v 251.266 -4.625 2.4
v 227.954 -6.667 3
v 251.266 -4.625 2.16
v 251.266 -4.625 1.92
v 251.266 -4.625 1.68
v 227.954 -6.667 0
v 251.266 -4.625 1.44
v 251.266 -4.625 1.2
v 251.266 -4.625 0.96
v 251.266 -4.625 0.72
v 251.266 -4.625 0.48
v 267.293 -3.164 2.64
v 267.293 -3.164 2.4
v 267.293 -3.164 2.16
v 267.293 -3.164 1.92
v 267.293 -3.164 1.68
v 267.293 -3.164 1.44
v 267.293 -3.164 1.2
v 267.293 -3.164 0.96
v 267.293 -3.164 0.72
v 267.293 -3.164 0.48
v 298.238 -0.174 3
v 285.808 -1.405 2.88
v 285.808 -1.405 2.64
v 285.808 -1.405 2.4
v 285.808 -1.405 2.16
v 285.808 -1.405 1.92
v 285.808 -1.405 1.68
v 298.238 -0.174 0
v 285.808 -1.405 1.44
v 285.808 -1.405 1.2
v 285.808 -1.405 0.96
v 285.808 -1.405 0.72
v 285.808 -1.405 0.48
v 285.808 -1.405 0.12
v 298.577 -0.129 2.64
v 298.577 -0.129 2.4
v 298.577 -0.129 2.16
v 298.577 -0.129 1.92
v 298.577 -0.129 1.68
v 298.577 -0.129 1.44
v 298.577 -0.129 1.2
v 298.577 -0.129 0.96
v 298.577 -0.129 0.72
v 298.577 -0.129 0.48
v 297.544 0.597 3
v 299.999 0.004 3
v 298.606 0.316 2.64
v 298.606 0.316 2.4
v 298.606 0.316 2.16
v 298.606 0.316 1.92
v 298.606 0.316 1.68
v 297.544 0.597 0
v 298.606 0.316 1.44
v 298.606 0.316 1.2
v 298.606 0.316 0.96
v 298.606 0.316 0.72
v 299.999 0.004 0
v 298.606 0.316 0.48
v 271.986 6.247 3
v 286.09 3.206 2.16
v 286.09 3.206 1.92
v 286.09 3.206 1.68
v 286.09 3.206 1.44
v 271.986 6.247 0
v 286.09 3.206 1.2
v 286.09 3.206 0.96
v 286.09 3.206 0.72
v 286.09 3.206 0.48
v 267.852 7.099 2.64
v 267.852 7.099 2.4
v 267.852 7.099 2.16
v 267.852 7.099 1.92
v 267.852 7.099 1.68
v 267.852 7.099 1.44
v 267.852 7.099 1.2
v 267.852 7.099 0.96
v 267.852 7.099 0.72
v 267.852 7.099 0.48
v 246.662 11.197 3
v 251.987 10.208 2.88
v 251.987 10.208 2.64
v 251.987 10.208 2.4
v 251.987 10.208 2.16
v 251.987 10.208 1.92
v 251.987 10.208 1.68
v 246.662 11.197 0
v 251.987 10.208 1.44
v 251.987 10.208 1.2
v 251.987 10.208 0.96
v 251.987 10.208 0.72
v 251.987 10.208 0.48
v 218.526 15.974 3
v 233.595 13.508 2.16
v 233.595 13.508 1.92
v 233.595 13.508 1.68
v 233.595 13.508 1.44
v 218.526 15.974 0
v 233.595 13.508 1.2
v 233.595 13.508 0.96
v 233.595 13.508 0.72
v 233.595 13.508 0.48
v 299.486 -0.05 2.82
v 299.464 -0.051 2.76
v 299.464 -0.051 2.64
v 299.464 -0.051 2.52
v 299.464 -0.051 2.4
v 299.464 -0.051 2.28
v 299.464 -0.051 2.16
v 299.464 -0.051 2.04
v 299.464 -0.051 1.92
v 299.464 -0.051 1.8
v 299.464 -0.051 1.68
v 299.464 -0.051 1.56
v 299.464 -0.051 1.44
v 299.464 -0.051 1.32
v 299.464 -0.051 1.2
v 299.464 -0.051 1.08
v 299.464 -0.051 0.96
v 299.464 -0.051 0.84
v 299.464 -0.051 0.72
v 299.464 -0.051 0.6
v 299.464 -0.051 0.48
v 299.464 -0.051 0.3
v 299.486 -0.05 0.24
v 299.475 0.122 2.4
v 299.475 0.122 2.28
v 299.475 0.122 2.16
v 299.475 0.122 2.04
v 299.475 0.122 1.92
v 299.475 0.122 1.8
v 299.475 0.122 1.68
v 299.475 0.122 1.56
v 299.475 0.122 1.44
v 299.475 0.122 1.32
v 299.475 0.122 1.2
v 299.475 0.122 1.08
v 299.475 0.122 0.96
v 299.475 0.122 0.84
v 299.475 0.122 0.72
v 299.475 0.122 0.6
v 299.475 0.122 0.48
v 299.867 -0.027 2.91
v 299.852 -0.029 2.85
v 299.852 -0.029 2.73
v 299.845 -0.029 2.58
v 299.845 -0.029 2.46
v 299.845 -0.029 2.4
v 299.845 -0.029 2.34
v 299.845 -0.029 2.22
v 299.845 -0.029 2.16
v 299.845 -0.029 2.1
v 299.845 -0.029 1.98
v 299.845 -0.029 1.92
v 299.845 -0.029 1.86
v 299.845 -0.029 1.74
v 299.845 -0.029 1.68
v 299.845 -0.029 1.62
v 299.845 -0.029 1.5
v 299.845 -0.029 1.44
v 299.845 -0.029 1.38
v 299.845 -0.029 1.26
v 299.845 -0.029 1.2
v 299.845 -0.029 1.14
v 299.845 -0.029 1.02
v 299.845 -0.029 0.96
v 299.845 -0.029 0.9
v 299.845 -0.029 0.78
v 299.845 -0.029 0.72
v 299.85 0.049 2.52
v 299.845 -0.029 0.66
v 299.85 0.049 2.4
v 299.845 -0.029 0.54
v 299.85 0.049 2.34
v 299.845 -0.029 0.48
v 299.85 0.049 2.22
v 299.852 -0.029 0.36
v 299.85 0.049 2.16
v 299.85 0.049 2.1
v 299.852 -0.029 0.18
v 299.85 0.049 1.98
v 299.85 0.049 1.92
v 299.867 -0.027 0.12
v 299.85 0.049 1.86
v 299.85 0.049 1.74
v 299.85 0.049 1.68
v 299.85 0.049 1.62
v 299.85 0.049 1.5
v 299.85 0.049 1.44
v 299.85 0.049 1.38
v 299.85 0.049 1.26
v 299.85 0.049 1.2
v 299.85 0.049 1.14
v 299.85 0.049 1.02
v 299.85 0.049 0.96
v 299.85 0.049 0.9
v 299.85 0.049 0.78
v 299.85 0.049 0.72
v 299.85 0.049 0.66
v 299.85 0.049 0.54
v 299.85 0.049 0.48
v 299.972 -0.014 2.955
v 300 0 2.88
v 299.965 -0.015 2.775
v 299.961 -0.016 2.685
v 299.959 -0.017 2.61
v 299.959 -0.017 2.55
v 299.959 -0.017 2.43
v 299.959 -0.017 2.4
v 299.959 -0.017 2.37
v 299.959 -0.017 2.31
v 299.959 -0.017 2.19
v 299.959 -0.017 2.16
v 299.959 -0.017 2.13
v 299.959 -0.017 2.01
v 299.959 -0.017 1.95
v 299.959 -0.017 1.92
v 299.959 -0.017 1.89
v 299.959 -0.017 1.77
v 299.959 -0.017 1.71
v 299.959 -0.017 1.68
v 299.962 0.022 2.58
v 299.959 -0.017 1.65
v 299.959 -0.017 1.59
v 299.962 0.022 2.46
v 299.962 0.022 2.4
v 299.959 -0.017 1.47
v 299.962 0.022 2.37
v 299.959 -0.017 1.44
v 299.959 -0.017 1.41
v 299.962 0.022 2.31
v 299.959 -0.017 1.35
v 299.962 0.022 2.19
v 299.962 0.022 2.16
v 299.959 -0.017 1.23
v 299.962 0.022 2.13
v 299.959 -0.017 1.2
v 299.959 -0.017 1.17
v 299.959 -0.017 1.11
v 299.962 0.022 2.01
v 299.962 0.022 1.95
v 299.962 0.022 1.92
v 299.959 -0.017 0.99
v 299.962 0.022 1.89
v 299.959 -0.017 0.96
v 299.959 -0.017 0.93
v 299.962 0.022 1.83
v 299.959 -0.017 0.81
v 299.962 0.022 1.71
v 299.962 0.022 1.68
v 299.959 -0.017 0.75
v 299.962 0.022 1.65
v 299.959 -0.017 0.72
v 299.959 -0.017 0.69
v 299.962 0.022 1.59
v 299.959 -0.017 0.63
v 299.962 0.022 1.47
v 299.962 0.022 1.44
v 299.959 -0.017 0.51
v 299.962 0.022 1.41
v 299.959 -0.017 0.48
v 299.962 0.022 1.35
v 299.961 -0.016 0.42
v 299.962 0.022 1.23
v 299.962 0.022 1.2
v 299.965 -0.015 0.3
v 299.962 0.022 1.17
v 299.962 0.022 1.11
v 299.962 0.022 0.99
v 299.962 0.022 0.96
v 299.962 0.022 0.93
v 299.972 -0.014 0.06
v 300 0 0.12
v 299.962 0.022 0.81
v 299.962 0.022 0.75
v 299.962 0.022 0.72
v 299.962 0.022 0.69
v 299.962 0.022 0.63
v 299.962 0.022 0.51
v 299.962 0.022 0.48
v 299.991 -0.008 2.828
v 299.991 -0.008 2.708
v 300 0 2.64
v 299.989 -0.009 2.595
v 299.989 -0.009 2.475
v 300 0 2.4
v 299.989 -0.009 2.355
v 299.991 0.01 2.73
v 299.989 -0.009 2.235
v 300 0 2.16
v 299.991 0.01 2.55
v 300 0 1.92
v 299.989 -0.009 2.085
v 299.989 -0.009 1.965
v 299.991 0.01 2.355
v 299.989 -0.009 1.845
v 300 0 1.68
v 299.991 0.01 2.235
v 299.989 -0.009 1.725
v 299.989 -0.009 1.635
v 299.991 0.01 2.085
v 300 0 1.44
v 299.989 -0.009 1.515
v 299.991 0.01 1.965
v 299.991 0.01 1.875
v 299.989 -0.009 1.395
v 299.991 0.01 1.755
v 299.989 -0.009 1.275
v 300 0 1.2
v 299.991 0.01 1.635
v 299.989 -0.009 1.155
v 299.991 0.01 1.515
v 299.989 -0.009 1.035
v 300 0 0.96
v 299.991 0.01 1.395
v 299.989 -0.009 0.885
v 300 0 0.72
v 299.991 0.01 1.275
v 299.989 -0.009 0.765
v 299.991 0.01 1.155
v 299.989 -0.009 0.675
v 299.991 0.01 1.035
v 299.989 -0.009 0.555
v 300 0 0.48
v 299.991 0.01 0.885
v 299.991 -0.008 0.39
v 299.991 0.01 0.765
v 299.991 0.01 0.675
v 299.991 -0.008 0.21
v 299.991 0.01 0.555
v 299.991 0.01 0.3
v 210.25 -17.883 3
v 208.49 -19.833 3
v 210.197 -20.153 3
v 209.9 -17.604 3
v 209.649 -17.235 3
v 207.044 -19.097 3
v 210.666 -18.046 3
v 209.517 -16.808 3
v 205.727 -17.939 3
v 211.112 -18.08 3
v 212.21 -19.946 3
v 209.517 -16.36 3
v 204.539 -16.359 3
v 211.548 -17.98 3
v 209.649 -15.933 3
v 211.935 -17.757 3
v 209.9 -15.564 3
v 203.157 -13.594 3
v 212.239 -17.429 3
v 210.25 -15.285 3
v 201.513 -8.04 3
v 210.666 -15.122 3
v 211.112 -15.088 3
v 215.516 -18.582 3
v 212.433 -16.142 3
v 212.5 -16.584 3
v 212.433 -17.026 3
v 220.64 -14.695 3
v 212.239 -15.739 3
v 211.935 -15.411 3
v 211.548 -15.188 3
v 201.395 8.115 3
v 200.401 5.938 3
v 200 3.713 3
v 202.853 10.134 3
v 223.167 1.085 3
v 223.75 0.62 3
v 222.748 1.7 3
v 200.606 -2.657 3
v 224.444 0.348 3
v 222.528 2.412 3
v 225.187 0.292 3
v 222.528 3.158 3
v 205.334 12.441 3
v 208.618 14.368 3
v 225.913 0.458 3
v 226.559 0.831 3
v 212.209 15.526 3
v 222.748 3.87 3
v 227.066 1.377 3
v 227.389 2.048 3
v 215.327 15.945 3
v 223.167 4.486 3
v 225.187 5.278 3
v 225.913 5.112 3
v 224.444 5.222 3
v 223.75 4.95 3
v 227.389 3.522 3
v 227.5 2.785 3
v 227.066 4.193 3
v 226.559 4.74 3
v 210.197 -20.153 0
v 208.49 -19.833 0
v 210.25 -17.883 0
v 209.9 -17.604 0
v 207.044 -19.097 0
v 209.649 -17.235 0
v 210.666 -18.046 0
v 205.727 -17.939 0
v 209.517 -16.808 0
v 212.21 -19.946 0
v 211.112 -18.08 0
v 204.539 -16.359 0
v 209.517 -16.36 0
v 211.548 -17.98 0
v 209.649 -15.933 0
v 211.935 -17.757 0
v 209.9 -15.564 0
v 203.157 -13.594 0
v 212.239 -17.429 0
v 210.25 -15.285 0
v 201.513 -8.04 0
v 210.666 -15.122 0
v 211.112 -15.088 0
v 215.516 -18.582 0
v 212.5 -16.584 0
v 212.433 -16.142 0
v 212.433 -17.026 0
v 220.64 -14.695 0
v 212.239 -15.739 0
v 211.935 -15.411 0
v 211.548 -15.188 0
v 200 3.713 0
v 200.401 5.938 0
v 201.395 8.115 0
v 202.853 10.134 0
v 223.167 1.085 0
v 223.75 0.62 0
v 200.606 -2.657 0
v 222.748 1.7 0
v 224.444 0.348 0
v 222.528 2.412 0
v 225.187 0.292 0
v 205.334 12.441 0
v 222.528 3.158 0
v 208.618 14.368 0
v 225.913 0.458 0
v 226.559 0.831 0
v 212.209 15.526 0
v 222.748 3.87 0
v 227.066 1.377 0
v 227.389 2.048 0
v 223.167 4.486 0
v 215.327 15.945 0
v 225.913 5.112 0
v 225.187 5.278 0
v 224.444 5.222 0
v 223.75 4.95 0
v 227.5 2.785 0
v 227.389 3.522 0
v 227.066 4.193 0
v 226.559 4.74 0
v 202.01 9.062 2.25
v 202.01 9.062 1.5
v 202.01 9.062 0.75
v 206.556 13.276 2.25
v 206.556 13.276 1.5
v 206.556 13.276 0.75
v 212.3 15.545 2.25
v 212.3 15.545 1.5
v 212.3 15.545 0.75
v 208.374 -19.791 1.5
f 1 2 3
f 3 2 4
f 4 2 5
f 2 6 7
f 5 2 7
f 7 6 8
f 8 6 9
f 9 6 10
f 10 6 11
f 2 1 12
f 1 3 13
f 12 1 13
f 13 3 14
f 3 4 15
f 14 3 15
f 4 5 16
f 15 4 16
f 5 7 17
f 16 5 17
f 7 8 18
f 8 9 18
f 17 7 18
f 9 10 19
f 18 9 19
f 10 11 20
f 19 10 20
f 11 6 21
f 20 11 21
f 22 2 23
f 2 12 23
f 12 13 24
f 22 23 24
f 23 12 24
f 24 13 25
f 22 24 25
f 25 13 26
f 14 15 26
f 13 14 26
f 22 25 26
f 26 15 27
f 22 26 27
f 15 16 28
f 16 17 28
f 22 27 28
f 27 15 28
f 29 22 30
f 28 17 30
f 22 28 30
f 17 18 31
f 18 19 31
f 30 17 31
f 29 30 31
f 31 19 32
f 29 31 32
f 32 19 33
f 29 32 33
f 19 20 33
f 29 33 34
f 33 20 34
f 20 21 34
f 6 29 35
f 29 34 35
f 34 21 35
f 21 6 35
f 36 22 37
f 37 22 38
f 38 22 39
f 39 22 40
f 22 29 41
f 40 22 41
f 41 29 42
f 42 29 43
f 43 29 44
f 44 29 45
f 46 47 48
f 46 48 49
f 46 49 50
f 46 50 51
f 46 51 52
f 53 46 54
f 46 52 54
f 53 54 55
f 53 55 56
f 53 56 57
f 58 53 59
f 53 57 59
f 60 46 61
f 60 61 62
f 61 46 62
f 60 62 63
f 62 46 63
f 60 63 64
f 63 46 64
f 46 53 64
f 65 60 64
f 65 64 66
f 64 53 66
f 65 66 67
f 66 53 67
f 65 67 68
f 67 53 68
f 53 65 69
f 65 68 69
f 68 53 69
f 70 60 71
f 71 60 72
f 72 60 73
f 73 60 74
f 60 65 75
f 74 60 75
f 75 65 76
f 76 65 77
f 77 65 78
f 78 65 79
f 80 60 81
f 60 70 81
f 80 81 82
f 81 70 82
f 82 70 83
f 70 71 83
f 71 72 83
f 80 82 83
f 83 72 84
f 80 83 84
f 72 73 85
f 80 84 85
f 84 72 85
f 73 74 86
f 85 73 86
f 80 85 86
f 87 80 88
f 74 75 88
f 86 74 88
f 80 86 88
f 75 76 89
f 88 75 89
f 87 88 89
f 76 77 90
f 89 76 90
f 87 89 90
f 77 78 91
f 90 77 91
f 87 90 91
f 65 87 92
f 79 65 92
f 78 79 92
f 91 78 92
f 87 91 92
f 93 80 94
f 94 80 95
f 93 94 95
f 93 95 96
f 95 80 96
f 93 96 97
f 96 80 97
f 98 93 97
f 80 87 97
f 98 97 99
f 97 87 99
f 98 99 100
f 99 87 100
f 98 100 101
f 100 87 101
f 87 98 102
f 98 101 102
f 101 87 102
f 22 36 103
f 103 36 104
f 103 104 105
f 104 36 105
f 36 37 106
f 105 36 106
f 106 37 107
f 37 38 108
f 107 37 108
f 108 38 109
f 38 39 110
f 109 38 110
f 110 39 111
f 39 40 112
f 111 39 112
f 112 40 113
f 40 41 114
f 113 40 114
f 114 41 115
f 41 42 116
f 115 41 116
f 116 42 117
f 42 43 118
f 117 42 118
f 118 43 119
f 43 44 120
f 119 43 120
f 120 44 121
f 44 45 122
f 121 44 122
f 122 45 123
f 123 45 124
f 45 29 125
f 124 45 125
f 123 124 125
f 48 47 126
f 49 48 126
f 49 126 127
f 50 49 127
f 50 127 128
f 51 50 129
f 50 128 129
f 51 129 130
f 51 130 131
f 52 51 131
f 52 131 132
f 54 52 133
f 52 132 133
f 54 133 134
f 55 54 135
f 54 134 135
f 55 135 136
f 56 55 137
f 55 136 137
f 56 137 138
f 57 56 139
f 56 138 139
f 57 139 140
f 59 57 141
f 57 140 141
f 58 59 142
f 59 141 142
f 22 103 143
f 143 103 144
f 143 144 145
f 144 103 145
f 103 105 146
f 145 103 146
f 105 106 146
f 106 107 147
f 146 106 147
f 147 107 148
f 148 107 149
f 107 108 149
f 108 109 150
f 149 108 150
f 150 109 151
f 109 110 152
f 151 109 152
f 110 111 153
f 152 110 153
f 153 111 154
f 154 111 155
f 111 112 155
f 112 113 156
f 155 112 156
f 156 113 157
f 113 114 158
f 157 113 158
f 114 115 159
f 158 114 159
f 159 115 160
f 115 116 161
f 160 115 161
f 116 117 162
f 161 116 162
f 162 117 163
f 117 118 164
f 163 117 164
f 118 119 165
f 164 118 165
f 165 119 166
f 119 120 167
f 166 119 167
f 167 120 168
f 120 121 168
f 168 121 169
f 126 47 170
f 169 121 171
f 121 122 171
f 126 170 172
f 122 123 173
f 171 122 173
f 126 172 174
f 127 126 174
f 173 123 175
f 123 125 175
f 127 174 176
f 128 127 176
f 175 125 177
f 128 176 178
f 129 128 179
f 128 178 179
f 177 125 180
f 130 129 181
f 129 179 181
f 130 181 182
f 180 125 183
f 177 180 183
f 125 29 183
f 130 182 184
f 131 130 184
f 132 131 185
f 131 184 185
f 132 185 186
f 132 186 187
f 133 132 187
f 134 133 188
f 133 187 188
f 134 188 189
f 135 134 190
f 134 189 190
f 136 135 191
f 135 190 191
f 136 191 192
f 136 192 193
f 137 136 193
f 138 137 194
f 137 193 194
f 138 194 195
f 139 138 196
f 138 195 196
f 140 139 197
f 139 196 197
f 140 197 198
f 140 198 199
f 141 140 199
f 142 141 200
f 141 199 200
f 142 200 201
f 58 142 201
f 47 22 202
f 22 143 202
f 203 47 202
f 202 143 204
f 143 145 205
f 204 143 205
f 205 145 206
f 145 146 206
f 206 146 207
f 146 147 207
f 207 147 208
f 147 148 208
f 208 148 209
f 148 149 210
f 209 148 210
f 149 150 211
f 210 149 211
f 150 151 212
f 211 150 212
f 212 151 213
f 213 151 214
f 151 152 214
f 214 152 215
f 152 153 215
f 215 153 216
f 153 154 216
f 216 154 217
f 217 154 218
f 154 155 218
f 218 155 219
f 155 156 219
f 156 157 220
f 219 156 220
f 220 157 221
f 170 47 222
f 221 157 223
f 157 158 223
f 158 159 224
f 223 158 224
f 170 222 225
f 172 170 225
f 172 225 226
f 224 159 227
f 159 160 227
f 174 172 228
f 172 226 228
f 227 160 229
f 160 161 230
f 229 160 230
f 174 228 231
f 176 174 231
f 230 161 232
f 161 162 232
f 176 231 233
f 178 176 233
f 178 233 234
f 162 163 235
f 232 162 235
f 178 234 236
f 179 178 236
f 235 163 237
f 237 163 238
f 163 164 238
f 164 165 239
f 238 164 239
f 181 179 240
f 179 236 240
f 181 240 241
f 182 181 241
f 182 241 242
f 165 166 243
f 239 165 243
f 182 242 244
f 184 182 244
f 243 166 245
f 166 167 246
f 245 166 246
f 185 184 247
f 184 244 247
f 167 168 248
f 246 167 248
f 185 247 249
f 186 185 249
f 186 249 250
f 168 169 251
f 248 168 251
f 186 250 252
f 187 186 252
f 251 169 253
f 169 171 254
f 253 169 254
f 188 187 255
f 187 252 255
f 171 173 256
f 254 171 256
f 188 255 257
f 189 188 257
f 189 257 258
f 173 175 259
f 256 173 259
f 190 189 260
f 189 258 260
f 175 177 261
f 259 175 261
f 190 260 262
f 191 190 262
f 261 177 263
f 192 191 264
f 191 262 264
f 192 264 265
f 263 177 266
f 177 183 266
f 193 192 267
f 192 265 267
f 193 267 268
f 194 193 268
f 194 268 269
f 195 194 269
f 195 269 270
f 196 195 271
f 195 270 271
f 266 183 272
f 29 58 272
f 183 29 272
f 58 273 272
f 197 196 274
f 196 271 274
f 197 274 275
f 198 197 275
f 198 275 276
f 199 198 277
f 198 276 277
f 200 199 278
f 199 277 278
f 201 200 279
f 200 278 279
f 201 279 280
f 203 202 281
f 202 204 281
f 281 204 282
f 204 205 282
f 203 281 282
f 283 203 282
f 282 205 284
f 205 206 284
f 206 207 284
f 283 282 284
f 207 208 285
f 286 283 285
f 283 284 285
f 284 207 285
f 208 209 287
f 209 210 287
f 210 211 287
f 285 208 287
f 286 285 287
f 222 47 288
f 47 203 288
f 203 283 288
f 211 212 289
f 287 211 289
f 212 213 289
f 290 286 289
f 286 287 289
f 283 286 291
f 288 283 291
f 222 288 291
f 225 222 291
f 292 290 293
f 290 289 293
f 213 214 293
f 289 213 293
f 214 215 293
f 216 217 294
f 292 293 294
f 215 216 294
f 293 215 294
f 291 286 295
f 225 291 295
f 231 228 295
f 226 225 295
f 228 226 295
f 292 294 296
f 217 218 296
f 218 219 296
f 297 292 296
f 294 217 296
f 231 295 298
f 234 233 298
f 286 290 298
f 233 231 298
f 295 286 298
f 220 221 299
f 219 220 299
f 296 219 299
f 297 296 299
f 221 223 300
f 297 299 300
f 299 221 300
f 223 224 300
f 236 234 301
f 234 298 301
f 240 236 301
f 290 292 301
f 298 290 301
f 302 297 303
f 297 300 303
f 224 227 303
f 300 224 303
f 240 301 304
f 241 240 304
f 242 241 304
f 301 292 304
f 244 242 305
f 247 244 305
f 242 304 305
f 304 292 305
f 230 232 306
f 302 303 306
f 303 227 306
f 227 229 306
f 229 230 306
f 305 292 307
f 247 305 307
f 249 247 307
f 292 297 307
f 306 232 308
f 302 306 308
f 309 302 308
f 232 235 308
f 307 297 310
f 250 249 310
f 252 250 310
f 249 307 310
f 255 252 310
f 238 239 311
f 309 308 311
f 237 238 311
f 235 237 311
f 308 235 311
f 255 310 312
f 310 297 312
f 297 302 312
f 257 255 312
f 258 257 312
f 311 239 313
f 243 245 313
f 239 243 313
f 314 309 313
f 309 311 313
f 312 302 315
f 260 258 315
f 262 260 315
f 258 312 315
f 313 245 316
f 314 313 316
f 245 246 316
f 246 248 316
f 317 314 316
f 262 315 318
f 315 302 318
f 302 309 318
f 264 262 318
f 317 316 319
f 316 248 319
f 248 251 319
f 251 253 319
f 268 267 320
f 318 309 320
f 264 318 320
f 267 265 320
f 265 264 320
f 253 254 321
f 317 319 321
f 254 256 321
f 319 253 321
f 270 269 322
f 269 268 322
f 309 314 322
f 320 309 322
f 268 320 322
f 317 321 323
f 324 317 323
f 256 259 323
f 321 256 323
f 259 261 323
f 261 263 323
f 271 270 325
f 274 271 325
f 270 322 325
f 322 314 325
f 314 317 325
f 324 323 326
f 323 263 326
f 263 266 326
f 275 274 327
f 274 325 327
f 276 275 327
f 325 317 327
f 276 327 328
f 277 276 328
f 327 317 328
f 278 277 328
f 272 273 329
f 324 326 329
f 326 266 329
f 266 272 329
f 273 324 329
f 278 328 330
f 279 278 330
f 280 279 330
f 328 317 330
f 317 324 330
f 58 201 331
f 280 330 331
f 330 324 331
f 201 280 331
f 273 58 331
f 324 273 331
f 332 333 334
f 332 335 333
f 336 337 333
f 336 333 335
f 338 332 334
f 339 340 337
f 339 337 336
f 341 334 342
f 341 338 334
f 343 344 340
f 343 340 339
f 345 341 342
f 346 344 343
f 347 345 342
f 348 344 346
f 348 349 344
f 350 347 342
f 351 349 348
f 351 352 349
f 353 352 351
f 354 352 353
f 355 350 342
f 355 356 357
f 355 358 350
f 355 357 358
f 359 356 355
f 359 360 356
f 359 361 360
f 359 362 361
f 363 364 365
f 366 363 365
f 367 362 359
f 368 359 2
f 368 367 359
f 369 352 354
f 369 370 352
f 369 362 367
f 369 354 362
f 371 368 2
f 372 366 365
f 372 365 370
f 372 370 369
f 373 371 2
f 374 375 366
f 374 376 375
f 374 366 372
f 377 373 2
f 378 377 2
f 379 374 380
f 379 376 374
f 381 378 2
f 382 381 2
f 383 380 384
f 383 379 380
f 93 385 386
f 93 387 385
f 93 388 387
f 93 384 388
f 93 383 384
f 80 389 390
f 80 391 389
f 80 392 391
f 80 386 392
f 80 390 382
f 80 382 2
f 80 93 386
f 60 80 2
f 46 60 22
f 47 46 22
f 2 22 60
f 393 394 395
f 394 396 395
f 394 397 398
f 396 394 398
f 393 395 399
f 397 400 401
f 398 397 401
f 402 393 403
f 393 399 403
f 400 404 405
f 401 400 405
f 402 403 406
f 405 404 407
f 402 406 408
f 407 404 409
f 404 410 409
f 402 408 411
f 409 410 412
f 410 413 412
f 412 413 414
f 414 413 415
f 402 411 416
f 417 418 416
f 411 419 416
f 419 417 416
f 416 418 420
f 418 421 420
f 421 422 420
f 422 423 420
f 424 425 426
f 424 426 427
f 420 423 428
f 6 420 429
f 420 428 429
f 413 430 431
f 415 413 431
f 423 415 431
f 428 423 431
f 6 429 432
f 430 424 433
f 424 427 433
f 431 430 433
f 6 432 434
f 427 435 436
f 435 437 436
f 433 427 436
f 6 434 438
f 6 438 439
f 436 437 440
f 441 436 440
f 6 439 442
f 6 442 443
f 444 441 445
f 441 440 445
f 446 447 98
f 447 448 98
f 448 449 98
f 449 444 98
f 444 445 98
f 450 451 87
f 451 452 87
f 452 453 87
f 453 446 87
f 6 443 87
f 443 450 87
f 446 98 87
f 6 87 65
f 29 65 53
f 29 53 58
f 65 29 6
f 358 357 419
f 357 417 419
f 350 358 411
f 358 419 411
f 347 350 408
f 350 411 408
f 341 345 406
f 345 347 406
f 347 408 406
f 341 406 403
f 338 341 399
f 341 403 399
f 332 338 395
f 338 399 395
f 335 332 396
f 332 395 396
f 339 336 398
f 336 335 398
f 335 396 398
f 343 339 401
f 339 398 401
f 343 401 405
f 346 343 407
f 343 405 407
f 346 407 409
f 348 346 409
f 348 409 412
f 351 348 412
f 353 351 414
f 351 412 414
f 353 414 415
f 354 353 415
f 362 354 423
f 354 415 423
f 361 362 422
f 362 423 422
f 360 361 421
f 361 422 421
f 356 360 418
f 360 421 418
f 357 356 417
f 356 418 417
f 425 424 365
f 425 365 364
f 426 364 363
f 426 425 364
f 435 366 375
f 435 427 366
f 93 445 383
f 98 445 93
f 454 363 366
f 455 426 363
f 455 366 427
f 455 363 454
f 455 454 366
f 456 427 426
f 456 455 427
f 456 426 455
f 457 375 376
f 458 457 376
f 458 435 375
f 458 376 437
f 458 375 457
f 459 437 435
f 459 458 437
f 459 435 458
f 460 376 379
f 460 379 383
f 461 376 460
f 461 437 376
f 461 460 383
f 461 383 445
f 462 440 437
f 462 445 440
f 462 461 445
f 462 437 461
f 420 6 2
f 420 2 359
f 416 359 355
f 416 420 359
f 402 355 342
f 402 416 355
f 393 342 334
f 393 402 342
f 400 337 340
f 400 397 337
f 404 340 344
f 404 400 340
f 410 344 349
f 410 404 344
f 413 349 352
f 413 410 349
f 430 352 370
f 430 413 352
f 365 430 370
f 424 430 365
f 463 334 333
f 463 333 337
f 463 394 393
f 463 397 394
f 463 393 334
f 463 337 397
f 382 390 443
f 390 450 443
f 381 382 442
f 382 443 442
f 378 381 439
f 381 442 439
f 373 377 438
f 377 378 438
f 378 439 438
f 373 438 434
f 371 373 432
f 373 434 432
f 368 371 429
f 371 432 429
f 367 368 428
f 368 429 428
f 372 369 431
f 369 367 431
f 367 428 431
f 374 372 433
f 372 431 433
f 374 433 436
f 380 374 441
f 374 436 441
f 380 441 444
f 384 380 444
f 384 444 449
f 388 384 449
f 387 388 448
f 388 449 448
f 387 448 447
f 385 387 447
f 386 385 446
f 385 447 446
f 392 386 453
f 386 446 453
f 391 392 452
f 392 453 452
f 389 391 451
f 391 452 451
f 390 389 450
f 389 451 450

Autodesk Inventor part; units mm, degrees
ref_plane "YZ Plane" through (0, 0, 0) normal (1, 0, 0) x (0, 1, 0)
ref_plane "XZ Plane" through (0, 0, 0) normal (0, 1, 0) x (-1, 0, 0)
ref_plane "XY Plane" through (0, 0, 0) normal (0, 0, 1) x (1, 0, 0)
sketch "Sketch1" plane through (0, 0, 0) normal (0, 0, 1) x (1, 0, 0)
  spline S0 degree 4 poles (227.9538, -6.6666) (233.9795, -6.1502) (242.1312, -5.4418) (252.1108, -4.5554) (263.3906, -3.5266) (270.7075, -2.8494) (277.2598, -2.2283) (283.0709, -1.6797) (287.955, -1.1879) (292.1861, -0.8066) (295.1251, -0.4496) (297.859, -0.2789) (298.9117, -0.0313) (300.6417, -0.0427) (298.9253, 0.1752) (297.9143, 0.5599) (295.2242, 1.0851) (292.3531, 1.8178) (288.198, 2.7284) (283.4022, 3.8159) (277.6828, 5.0504) (271.2241, 6.4164) (263.9961, 7.8887) (256.0707, 9.4454) (247.4873, 11.0611) (237.0929, 12.9289) (228.6426, 14.3598) (222.3187, 15.3801) (218.5257, 15.9738) knots 0 0 0 0 0 0.123617 0.170541 0.215522 0.258317 0.298656 0.336232 0.370677 0.401524 0.428109 0.449222 0.465805 0.481001 0.497585 0.518702 0.545296 0.576159 0.61063 0.648244 0.688637 0.731505 0.776579 0.823621 0.872406 0.922727 1 1 1 1 1
  line L0 (200, 103) -> (200, -97) construction
  line L1 (300, -103) -> (300, 103) construction
  line L2 (200, 3.7134) -> (300, 0) construction
  circle A0 centre (225, 2.7851) radius 2.5
  line L3 (230.0222, 14.1744) -> (207.0292, 17.7732) construction
  arc A1 (227.7164, 14.4946) -> (209.3226, 17.3735) centre (52.1769, -1046.8526) ccw construction
  spline S1 degree 4 poles (200, 3.7134) (200.1429, 9.1319) (206.2023, 15.2323) (212.1452, 16.2028) (218.5257, 15.9738) knots 0 0 0 0 0 1 1 1 1 1
  line L4 (212.7843, 16.1798) -> (224.2671, 15.7678) construction
  arc A2 (223.0893, 15.5881) -> (213.9461, 15.9162) centre (216.8298, -31.2827) ccw construction
  line L5 (199.8716, -1.156) -> (200.1284, 8.5828) construction
  arc A3 (200.9996, 7.0523) -> (200.8223, 0.3265) centre (206.6628, 3.5377) ccw construction
  spline S2 degree 2 poles (227.9538, -6.6666) (202.7705, -38.1054) (200, 3.7134) knots 0 0 0 1 1 1
  circle A4 centre (211, -16.584) radius 1.5
  line L6 (197, -35.9531) -> (225, 2.7851) construction
  point P0 (299.5428, 0.1089)
  point P1 (298.1739, 0.4338)
  point P2 (295.9008, 0.9681)
  point P3 (292.7367, 1.7025)
  point P4 (288.6996, 2.6229)
  point P5 (283.8129, 3.7134)
  point P6 (278.1048, 4.9545)
  point P7 (271.6086, 6.3255)
  point P8 (264.3621, 7.8039)
  point P9 (256.4085, 9.3663)
  point P10 (247.7946, 10.9887)
  point P11 (238.572, 12.6468)
  point P12 (228.7959, 14.3166)
  point P13 (207.8235, 17.5944)
  point P14 (247.0398, -5.0019)
  point P15 (255.7236, -4.2234)
  point P16 (263.7597, -3.4905)
  point P17 (271.0965, -2.8098)
  point P18 (277.6872, -2.1882)
  point P19 (283.4889, -1.6323)
  point P20 (288.4641, -1.1487)
  point P21 (292.5804, -0.7434)
  point P22 (295.8102, -0.4221)
  point P23 (298.1328, -0.1887)
  point P24 (299.5323, -0.0474)
  point P25 (208.6203, -19.8763)
  dimension "d17" = 100
  dimension "d22" = 5
  dimension "d23" = 75
  dimension "d36" = 3
sketch "Sketch3" plane through (0, 0, 0) normal (0, 0, 1) x (1, 0, 0)
  point P0 (0, 0)
sketch "Sketch4" plane through (0, 0, 0) normal (0, 0, 1) x (1, 0, 0)
  point P0 (0, 0)
sketch "Sketch5" plane through (0, 0, 0) normal (0, 0, 1) x (1, 0, 0)
  point P0 (0, 0)
sketch "Sketch6" plane through (0, 0, 0) normal (0, 0, 1) x (1, 0, 0)
  point P0 (0, 0)
sketch "Sketch7" plane through (0, 0, 0) normal (0, 0, 1) x (1, 0, 0)
  point P0 (0, 0)
sketch "Sketch8" plane through (0, 0, 0) normal (0, 0, 1) x (1, 0, 0)
  point P0 (0, 0)
extrude "Extrusion2" add sketch "Sketch1" along normal blind 3
properties part number "AIL middle connecting rib extension assembly" material "Plywood, Finish"
